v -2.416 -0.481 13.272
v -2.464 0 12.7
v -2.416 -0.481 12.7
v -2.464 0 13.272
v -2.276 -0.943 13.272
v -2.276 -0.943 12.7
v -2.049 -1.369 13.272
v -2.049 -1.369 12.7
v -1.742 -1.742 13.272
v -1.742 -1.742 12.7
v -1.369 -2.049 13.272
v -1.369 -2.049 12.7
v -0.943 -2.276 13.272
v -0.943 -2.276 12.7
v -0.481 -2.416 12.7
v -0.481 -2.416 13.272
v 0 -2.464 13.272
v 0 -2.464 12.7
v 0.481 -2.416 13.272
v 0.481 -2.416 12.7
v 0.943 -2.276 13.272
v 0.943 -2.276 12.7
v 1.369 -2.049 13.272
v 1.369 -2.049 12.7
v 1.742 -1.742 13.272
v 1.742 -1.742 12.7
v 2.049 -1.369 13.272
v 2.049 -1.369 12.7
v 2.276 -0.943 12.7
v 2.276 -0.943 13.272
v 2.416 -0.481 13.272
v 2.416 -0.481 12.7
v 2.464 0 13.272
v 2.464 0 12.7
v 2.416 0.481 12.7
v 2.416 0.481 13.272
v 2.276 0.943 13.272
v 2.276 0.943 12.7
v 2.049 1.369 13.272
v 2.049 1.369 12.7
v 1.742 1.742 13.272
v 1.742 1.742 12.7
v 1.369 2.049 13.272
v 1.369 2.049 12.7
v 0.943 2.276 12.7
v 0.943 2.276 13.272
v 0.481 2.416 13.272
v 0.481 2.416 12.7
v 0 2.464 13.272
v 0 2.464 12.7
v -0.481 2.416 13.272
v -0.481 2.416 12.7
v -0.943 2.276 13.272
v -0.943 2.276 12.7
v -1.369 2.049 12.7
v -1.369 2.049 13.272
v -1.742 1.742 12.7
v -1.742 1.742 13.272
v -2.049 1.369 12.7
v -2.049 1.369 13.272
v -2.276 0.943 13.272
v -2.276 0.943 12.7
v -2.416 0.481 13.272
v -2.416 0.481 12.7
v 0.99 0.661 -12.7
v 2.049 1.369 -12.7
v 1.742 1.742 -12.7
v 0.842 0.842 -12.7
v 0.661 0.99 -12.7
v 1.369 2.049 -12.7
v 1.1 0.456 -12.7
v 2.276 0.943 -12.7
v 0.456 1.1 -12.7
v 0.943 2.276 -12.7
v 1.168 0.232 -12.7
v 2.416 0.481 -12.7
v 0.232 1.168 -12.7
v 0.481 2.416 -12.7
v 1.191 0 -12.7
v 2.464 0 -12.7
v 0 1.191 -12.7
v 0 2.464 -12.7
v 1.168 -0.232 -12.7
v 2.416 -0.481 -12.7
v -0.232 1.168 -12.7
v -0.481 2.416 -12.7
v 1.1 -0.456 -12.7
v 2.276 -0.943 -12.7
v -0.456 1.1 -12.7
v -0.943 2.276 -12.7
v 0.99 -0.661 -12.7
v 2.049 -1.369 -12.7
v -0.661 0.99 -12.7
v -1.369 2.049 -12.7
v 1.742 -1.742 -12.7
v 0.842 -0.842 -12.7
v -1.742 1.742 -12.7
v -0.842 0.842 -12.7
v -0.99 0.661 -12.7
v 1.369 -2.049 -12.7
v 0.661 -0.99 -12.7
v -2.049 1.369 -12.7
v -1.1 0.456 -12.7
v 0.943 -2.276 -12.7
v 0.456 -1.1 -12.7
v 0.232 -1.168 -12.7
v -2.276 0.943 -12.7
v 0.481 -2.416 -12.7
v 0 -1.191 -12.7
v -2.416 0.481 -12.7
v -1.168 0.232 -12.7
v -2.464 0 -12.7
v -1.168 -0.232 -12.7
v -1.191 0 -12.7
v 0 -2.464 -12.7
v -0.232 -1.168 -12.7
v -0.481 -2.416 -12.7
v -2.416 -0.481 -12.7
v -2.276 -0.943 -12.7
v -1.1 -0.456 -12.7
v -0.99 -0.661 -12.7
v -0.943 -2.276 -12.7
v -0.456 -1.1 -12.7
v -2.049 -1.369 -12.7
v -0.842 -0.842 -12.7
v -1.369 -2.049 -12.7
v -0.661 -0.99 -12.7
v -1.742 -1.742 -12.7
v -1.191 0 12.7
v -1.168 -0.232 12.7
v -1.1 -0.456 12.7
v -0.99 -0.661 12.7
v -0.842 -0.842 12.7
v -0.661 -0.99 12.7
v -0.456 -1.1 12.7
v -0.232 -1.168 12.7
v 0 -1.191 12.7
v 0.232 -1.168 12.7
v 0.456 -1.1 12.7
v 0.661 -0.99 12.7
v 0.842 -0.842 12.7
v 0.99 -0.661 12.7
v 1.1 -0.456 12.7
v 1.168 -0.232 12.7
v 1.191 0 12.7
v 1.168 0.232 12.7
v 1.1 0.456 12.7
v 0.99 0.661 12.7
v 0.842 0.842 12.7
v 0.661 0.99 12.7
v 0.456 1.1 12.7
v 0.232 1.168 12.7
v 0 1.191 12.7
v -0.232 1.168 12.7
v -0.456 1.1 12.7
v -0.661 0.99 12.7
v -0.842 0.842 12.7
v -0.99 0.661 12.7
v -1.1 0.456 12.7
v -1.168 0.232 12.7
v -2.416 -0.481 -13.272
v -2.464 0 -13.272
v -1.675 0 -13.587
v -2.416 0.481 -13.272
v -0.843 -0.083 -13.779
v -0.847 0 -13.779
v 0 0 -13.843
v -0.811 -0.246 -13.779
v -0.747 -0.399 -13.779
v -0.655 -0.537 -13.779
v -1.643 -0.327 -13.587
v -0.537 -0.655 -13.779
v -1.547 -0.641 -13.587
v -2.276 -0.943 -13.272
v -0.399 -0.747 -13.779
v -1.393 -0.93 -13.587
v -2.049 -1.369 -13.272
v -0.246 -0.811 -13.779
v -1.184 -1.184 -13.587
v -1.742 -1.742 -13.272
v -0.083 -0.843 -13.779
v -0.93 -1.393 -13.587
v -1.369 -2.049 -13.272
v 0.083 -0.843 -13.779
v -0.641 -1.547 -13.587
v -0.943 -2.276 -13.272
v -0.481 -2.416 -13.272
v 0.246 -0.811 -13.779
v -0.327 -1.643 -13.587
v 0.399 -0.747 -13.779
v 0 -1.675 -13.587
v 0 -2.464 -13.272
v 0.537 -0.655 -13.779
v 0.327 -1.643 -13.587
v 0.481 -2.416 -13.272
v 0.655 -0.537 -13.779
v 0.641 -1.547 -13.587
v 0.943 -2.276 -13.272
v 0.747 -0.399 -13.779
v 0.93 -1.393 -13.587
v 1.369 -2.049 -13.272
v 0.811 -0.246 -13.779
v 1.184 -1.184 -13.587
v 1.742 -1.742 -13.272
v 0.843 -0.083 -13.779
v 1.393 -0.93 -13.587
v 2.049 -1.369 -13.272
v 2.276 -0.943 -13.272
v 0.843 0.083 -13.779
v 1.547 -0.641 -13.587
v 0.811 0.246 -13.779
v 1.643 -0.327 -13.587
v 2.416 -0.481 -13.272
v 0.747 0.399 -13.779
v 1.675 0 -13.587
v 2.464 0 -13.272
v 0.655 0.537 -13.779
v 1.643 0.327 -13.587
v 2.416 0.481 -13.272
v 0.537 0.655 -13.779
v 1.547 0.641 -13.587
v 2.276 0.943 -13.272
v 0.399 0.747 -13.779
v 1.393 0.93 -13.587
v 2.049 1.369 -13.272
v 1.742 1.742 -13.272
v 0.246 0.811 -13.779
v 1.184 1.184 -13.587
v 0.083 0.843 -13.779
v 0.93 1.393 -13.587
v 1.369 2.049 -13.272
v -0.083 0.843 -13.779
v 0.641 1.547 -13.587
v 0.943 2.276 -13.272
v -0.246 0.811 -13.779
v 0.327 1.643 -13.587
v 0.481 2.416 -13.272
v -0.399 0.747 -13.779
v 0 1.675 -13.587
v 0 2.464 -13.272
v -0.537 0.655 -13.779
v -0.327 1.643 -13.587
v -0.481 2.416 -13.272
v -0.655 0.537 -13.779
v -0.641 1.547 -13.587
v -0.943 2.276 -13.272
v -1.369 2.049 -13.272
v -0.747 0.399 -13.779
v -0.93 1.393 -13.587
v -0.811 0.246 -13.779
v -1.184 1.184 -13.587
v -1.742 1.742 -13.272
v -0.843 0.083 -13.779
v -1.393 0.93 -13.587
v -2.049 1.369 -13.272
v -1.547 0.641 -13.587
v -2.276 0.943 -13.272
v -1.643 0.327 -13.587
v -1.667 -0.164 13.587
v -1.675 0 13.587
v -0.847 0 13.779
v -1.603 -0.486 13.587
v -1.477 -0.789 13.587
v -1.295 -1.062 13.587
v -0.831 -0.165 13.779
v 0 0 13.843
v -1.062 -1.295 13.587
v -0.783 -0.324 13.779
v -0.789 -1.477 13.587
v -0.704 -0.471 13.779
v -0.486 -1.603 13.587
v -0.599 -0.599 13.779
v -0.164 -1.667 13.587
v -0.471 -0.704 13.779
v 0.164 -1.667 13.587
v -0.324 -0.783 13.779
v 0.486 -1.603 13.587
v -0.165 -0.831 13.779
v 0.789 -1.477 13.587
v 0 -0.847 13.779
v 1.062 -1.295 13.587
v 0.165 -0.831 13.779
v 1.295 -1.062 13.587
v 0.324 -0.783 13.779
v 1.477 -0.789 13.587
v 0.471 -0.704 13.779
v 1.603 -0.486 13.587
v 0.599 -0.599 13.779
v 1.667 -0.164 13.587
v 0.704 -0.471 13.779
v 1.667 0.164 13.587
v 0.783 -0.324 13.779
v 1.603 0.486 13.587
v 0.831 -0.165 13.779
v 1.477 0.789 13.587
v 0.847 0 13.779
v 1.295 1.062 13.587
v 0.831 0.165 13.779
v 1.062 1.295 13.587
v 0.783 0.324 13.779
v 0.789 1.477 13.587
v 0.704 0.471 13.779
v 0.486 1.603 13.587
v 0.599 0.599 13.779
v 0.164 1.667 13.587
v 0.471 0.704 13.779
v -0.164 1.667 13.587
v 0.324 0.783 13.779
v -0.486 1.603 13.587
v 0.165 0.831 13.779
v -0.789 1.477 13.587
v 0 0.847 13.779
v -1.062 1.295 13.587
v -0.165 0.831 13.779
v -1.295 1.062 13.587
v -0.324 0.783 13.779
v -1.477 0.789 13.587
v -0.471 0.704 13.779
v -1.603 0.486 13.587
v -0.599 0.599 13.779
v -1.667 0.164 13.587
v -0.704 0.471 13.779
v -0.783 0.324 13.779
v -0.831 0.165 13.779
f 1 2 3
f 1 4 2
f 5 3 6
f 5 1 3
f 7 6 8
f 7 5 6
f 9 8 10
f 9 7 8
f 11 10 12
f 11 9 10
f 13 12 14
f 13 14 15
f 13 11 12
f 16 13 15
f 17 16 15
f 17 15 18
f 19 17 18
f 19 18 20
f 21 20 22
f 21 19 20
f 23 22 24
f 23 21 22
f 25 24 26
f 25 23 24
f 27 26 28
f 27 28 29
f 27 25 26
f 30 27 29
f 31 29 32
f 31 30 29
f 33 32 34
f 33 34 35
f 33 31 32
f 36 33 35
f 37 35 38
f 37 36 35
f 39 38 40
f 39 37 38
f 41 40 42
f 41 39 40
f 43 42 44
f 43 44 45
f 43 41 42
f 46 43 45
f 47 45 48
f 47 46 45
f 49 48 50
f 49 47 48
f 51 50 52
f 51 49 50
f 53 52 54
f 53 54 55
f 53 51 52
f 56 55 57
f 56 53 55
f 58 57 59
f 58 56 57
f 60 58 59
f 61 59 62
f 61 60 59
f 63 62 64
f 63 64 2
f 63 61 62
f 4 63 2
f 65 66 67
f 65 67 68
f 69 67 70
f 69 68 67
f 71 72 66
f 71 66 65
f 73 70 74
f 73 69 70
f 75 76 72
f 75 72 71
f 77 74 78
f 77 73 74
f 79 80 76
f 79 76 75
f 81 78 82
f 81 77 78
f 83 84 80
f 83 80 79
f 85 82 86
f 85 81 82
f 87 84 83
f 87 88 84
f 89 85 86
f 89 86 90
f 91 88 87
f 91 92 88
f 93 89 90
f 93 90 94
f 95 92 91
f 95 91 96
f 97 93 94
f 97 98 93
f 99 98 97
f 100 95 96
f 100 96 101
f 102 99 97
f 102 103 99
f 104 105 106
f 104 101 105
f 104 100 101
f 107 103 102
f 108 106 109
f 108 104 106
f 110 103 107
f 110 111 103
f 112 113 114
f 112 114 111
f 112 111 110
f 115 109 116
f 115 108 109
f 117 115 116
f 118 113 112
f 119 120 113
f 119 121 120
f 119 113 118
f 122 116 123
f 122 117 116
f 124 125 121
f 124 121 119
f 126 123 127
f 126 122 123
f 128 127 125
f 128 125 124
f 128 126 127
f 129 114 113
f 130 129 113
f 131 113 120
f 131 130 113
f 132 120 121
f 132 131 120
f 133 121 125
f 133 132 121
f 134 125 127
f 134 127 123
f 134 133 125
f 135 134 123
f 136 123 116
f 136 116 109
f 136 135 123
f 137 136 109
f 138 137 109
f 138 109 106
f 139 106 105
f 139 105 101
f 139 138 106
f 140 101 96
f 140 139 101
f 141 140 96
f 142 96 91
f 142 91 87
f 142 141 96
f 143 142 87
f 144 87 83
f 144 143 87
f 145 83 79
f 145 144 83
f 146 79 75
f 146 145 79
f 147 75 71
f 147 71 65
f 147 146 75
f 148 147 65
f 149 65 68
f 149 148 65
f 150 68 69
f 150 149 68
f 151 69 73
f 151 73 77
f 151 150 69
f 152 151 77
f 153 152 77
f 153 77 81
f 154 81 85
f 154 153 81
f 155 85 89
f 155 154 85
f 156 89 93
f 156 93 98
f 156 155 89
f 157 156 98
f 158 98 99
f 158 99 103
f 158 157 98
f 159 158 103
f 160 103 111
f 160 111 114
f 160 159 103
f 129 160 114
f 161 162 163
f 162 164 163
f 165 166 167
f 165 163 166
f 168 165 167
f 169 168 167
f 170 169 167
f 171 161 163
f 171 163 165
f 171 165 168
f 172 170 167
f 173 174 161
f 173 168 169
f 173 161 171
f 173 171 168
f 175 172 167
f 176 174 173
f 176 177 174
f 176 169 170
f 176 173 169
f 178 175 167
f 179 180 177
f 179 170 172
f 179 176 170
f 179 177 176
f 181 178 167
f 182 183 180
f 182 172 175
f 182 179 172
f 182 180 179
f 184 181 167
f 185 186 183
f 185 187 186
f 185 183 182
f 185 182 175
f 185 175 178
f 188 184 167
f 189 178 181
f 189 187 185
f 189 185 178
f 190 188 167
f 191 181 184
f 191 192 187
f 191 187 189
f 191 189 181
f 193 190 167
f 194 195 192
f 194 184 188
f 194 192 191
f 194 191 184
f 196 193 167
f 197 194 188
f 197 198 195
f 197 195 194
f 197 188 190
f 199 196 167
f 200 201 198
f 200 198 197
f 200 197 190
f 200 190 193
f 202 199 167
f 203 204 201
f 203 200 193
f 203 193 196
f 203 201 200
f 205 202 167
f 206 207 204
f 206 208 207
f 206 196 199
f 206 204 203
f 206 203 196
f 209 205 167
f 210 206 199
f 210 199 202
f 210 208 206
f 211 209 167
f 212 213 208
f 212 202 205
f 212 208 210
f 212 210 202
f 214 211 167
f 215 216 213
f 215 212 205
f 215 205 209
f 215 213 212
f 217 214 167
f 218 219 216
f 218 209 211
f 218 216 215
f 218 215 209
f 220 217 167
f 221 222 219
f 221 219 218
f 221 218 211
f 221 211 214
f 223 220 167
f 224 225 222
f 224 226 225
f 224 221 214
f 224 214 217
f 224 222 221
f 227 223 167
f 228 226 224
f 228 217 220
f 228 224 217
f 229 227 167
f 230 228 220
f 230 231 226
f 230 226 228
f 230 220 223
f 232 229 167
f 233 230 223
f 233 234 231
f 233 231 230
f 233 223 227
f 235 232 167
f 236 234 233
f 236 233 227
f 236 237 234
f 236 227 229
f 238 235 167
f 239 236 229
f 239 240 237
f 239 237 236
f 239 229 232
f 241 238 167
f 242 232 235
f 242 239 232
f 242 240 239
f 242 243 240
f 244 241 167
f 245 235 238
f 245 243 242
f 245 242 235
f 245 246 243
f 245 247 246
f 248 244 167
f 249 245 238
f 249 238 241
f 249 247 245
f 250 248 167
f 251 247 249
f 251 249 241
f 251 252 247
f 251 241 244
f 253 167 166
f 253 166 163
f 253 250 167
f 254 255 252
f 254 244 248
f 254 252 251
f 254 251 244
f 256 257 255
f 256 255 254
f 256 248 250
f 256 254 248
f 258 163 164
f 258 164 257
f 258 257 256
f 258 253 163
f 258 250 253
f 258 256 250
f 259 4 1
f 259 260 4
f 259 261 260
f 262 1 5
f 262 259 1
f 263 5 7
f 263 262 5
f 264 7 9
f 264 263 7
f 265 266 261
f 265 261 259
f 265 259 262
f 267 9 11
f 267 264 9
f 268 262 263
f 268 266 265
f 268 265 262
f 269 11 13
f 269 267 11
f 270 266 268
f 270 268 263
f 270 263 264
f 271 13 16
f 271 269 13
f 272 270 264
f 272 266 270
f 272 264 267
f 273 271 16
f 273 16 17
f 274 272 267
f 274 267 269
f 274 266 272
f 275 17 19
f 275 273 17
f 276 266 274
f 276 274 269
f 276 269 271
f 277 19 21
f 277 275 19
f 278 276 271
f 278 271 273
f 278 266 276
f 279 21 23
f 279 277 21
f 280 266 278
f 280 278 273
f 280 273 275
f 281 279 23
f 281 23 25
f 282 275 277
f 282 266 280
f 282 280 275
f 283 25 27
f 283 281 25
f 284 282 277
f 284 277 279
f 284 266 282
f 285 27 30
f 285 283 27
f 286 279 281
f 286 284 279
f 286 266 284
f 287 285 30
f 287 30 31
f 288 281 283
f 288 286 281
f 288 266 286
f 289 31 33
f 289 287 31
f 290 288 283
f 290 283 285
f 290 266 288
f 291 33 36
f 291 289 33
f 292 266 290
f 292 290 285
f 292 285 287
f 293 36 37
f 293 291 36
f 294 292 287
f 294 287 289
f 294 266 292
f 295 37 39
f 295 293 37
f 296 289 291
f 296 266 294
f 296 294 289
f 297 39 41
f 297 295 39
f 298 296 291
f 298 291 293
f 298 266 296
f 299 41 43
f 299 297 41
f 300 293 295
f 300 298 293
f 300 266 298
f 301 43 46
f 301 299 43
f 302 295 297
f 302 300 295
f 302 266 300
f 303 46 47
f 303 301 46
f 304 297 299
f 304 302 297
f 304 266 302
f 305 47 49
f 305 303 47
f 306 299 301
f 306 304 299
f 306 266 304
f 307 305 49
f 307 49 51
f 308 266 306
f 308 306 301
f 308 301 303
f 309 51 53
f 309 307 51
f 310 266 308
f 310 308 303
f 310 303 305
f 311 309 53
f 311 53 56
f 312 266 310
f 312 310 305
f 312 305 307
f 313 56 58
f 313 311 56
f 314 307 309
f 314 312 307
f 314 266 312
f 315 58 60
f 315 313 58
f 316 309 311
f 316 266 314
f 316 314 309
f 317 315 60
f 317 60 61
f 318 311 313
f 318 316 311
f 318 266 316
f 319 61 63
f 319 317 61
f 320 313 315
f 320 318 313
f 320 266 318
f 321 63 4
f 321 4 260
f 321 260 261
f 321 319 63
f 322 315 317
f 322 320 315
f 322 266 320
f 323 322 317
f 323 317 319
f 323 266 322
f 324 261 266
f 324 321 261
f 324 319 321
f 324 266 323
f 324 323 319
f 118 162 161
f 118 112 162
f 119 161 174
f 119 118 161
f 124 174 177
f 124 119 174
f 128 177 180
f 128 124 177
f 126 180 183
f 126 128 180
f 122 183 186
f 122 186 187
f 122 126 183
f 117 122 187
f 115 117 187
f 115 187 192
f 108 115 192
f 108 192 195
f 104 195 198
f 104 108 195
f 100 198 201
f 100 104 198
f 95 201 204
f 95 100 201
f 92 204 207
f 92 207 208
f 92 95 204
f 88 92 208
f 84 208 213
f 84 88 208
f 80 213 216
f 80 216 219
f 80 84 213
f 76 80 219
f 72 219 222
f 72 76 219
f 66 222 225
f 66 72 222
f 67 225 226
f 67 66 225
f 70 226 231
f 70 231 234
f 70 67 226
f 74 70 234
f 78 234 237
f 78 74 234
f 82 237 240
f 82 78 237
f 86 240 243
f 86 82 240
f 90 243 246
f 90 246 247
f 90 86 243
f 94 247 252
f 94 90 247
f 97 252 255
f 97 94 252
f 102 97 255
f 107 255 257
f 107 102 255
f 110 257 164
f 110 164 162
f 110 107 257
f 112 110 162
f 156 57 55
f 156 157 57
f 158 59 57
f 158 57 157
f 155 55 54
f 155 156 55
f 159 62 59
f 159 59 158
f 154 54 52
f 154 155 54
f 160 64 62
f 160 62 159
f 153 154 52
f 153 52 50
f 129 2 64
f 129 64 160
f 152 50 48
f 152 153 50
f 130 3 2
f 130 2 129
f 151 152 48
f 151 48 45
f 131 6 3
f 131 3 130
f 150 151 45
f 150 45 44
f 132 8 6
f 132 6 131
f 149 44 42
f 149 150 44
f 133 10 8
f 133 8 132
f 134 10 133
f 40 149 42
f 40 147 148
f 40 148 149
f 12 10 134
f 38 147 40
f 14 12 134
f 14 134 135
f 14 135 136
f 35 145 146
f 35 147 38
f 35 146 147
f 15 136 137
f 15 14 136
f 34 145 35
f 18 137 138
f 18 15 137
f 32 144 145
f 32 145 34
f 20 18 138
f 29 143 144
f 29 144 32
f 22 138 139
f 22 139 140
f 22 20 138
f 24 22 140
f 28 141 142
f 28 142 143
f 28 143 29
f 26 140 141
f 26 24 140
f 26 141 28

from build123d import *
from OCP.BRepFilletAPI import BRepFilletAPI_MakeChamfer

# Parameters (mm, degrees)
SKETCH1_R           = 1.190625
EXTRUDE1_DEPTH      = 12.7
SKETCH1_W           = 9.8552
SKETCH1_H           = 1.27
EXTRUDE1_2_DEPTH    = 12.7
SKETCH20_R          = 1.4224
EXTRUDE24_DEPTH     = 20.045522232
CHAMFER2_SIZE       = 0.635
CHAMFER2_SIZE2      = 0.551997079
EXTRUDE4_DEPTH      = 19.94700397
EXTRUDE4_DEPTH_BACK = 19.94700397
SKETCH8_W           = 5.6896
SKETCH8_H           = 8.466666666
SKETCH9_R           = 1.190625
EXTRUDE5_DEPTH      = 8.466666667


# Read off the part's stored shape, not the designer's step: Mirror2
with BuildPart() as part:
    # Sketch1 → Extrude1 (new, symmetric)
    with BuildSketch(Plane.XY):
        with BuildLine():
            Line((12.7, -2.157017049), (1.190625, -2.157017049))
            ThreePointArc((1.190625, -2.157017049), (-1.856577095, 1.619701185), (2.298588957, -0.887017049))
            Line((2.298588957, -0.887017049), (12.7, -0.887017049))
            Line((12.7, -0.887017049), (12.7, -2.157017049))
        make_face()
        Circle(SKETCH1_R, mode=Mode.SUBTRACT)
    extrude(amount=EXTRUDE1_DEPTH, both=True)

    # Mirror2 outline → Mirror2 (revolve, cut)
    with BuildSketch(Plane(origin=(8.3312, 0, -7.8486), x_dir=(1, 0, 0), z_dir=(0, 0, 1))):
        Polygon((1.784715731, -0.887017049), (0, -0.887017049), (0, -1.93881362), (1.4224, -1.93881362), (1.4224, -1.30381362), align=None)
    revolve(axis=Axis((8.3312, 0, -7.8486), (0, 1, 0)), mode=Mode.SUBTRACT)

    # Mirror2 2 outline → Mirror2 2 (revolve, cut)
    with BuildSketch(Plane(origin=(8.3312, 0, 7.8486), x_dir=(1, 0, 0), z_dir=(0, 0, 1))):
        Polygon((0, -0.887017049), (0, -1.93881362), (1.4224, -1.93881362), (1.4224, -1.30381362), (1.784715731, -0.887017049), align=None)
    revolve(axis=Axis((8.3312, 0, 7.8486), (0, 1, 0)), mode=Mode.SUBTRACT)

    # Sketch8 → Extrude4 (cut, two sides: drawn at the far end of the back side and taken through both)
    with BuildSketch(Plane(origin=(0, 0, 0), x_dir=(1, 0, 0), z_dir=(0, 1, 0)).offset(-EXTRUDE4_DEPTH_BACK)):
        Rectangle(SKETCH8_W, SKETCH8_H)
    extrude(amount=EXTRUDE4_DEPTH + EXTRUDE4_DEPTH_BACK, mode=Mode.SUBTRACT)


with BuildPart() as body_2:
    # Sketch1 → Extrude1 2 (new, symmetric)
    with BuildSketch(Plane.XY):
        with Locations((-7.7724, -1.30381362)):
            Rectangle(SKETCH1_W, SKETCH1_H)
    extrude(amount=EXTRUDE1_2_DEPTH, both=True)

    # Sketch20 → Extrude24 (cut, through all)
    with BuildSketch(Plane(origin=(0, -0.66881362, 0), x_dir=(1, 0, 0), z_dir=(0, 1, 0))):
        with Locations(Location((-8.3312, 7.8486, 0), (0, 0, 270))):
            Circle(SKETCH20_R)
        with Locations(Location((-8.3312, -7.8486, 0), (0, 0, 270))):
            Circle(SKETCH20_R)
    extrude(amount=-EXTRUDE24_DEPTH, mode=Mode.SUBTRACT)

    # Chamfer2: one chamfer whose edges measure the first distance from different faces: ONE call of the kernel's chamfer builder (chamfer() names one face for all edges)
    chamfer2_edges_1 = [body_2.edges().sort_by_distance(p)[0] for p in [
        (-8.3312, -0.66881362, -9.271),
    ]]
    chamfer2_side_1 = [body_2.faces().sort_by_distance(p)[0] for p in [
        (-8.3312, -1.30381362, -9.271),
    ]]
    chamfer2_edges_2 = [body_2.edges().sort_by_distance(p)[0] for p in [
        (-8.3312, -0.66881362, 6.4262),
    ]]
    chamfer2_side_2 = [body_2.faces().sort_by_distance(p)[0] for p in [
        (-8.3312, -1.30381362, 6.4262),
    ]]
    chamfer2 = BRepFilletAPI_MakeChamfer(body_2.part.solid().wrapped)
    for e in chamfer2_edges_1:
        chamfer2.Add(CHAMFER2_SIZE, CHAMFER2_SIZE2, e.wrapped, chamfer2_side_1[0].wrapped)  # the first distance lies on this face
    for e in chamfer2_edges_2:
        chamfer2.Add(CHAMFER2_SIZE, CHAMFER2_SIZE2, e.wrapped, chamfer2_side_2[0].wrapped)  # the first distance lies on this face
    add(Compound.cast(chamfer2.Shape()), mode=Mode.REPLACE)

    # Sketch9 → Extrude5 (add)
    with BuildSketch(Plane.XY.offset(-4.233333333)):
        with BuildLine():
            Line((-2.371286314, -0.66881362), (-2.8448, -0.66881362))
            Line((-2.8448, -0.66881362), (-2.8448, -1.93881362))
            Line((-2.8448, -1.93881362), (-1.520300032, -1.93881362))
            ThreePointArc((-1.520300032, -1.93881362), (2.046786768, 1.371486189), (-2.371286314, -0.66881362))
        make_face()
        with Locations(Location((0, 0, 0), (0, 0, 180))):
            Circle(SKETCH9_R, mode=Mode.SUBTRACT)
    extrude(amount=EXTRUDE5_DEPTH)


with BuildPart() as body_3:
    # Sketch6 → Revolve1 (revolve)
    with BuildSketch(Plane(origin=(0, 0, 0), x_dir=(1, 0, 0), z_dir=(0, 1, 0))):
        with BuildLine():
            Line((-2.4638, -12.7), (-2.4638, -13.2715))
            ThreePointArc((-2.4638, -13.2715), (-1.264606924, -13.698253184), (0, -13.843))
            Line((0, -13.843), (0, 13.843))
            ThreePointArc((0, 13.843), (-1.264606924, 13.698253184), (-2.4638, 13.2715))
            Line((-2.4638, 13.2715), (-2.4638, 12.7))
            Line((-2.4638, 12.7), (-1.190625, 12.7))
            Line((-1.190625, 12.7), (-1.190625, -12.7))
            Line((-1.190625, -12.7), (-2.4638, -12.7))
        make_face()
    revolve(axis=Axis((0, 0, -13.843), (0, 0, 1)))


solid = body_3.part
